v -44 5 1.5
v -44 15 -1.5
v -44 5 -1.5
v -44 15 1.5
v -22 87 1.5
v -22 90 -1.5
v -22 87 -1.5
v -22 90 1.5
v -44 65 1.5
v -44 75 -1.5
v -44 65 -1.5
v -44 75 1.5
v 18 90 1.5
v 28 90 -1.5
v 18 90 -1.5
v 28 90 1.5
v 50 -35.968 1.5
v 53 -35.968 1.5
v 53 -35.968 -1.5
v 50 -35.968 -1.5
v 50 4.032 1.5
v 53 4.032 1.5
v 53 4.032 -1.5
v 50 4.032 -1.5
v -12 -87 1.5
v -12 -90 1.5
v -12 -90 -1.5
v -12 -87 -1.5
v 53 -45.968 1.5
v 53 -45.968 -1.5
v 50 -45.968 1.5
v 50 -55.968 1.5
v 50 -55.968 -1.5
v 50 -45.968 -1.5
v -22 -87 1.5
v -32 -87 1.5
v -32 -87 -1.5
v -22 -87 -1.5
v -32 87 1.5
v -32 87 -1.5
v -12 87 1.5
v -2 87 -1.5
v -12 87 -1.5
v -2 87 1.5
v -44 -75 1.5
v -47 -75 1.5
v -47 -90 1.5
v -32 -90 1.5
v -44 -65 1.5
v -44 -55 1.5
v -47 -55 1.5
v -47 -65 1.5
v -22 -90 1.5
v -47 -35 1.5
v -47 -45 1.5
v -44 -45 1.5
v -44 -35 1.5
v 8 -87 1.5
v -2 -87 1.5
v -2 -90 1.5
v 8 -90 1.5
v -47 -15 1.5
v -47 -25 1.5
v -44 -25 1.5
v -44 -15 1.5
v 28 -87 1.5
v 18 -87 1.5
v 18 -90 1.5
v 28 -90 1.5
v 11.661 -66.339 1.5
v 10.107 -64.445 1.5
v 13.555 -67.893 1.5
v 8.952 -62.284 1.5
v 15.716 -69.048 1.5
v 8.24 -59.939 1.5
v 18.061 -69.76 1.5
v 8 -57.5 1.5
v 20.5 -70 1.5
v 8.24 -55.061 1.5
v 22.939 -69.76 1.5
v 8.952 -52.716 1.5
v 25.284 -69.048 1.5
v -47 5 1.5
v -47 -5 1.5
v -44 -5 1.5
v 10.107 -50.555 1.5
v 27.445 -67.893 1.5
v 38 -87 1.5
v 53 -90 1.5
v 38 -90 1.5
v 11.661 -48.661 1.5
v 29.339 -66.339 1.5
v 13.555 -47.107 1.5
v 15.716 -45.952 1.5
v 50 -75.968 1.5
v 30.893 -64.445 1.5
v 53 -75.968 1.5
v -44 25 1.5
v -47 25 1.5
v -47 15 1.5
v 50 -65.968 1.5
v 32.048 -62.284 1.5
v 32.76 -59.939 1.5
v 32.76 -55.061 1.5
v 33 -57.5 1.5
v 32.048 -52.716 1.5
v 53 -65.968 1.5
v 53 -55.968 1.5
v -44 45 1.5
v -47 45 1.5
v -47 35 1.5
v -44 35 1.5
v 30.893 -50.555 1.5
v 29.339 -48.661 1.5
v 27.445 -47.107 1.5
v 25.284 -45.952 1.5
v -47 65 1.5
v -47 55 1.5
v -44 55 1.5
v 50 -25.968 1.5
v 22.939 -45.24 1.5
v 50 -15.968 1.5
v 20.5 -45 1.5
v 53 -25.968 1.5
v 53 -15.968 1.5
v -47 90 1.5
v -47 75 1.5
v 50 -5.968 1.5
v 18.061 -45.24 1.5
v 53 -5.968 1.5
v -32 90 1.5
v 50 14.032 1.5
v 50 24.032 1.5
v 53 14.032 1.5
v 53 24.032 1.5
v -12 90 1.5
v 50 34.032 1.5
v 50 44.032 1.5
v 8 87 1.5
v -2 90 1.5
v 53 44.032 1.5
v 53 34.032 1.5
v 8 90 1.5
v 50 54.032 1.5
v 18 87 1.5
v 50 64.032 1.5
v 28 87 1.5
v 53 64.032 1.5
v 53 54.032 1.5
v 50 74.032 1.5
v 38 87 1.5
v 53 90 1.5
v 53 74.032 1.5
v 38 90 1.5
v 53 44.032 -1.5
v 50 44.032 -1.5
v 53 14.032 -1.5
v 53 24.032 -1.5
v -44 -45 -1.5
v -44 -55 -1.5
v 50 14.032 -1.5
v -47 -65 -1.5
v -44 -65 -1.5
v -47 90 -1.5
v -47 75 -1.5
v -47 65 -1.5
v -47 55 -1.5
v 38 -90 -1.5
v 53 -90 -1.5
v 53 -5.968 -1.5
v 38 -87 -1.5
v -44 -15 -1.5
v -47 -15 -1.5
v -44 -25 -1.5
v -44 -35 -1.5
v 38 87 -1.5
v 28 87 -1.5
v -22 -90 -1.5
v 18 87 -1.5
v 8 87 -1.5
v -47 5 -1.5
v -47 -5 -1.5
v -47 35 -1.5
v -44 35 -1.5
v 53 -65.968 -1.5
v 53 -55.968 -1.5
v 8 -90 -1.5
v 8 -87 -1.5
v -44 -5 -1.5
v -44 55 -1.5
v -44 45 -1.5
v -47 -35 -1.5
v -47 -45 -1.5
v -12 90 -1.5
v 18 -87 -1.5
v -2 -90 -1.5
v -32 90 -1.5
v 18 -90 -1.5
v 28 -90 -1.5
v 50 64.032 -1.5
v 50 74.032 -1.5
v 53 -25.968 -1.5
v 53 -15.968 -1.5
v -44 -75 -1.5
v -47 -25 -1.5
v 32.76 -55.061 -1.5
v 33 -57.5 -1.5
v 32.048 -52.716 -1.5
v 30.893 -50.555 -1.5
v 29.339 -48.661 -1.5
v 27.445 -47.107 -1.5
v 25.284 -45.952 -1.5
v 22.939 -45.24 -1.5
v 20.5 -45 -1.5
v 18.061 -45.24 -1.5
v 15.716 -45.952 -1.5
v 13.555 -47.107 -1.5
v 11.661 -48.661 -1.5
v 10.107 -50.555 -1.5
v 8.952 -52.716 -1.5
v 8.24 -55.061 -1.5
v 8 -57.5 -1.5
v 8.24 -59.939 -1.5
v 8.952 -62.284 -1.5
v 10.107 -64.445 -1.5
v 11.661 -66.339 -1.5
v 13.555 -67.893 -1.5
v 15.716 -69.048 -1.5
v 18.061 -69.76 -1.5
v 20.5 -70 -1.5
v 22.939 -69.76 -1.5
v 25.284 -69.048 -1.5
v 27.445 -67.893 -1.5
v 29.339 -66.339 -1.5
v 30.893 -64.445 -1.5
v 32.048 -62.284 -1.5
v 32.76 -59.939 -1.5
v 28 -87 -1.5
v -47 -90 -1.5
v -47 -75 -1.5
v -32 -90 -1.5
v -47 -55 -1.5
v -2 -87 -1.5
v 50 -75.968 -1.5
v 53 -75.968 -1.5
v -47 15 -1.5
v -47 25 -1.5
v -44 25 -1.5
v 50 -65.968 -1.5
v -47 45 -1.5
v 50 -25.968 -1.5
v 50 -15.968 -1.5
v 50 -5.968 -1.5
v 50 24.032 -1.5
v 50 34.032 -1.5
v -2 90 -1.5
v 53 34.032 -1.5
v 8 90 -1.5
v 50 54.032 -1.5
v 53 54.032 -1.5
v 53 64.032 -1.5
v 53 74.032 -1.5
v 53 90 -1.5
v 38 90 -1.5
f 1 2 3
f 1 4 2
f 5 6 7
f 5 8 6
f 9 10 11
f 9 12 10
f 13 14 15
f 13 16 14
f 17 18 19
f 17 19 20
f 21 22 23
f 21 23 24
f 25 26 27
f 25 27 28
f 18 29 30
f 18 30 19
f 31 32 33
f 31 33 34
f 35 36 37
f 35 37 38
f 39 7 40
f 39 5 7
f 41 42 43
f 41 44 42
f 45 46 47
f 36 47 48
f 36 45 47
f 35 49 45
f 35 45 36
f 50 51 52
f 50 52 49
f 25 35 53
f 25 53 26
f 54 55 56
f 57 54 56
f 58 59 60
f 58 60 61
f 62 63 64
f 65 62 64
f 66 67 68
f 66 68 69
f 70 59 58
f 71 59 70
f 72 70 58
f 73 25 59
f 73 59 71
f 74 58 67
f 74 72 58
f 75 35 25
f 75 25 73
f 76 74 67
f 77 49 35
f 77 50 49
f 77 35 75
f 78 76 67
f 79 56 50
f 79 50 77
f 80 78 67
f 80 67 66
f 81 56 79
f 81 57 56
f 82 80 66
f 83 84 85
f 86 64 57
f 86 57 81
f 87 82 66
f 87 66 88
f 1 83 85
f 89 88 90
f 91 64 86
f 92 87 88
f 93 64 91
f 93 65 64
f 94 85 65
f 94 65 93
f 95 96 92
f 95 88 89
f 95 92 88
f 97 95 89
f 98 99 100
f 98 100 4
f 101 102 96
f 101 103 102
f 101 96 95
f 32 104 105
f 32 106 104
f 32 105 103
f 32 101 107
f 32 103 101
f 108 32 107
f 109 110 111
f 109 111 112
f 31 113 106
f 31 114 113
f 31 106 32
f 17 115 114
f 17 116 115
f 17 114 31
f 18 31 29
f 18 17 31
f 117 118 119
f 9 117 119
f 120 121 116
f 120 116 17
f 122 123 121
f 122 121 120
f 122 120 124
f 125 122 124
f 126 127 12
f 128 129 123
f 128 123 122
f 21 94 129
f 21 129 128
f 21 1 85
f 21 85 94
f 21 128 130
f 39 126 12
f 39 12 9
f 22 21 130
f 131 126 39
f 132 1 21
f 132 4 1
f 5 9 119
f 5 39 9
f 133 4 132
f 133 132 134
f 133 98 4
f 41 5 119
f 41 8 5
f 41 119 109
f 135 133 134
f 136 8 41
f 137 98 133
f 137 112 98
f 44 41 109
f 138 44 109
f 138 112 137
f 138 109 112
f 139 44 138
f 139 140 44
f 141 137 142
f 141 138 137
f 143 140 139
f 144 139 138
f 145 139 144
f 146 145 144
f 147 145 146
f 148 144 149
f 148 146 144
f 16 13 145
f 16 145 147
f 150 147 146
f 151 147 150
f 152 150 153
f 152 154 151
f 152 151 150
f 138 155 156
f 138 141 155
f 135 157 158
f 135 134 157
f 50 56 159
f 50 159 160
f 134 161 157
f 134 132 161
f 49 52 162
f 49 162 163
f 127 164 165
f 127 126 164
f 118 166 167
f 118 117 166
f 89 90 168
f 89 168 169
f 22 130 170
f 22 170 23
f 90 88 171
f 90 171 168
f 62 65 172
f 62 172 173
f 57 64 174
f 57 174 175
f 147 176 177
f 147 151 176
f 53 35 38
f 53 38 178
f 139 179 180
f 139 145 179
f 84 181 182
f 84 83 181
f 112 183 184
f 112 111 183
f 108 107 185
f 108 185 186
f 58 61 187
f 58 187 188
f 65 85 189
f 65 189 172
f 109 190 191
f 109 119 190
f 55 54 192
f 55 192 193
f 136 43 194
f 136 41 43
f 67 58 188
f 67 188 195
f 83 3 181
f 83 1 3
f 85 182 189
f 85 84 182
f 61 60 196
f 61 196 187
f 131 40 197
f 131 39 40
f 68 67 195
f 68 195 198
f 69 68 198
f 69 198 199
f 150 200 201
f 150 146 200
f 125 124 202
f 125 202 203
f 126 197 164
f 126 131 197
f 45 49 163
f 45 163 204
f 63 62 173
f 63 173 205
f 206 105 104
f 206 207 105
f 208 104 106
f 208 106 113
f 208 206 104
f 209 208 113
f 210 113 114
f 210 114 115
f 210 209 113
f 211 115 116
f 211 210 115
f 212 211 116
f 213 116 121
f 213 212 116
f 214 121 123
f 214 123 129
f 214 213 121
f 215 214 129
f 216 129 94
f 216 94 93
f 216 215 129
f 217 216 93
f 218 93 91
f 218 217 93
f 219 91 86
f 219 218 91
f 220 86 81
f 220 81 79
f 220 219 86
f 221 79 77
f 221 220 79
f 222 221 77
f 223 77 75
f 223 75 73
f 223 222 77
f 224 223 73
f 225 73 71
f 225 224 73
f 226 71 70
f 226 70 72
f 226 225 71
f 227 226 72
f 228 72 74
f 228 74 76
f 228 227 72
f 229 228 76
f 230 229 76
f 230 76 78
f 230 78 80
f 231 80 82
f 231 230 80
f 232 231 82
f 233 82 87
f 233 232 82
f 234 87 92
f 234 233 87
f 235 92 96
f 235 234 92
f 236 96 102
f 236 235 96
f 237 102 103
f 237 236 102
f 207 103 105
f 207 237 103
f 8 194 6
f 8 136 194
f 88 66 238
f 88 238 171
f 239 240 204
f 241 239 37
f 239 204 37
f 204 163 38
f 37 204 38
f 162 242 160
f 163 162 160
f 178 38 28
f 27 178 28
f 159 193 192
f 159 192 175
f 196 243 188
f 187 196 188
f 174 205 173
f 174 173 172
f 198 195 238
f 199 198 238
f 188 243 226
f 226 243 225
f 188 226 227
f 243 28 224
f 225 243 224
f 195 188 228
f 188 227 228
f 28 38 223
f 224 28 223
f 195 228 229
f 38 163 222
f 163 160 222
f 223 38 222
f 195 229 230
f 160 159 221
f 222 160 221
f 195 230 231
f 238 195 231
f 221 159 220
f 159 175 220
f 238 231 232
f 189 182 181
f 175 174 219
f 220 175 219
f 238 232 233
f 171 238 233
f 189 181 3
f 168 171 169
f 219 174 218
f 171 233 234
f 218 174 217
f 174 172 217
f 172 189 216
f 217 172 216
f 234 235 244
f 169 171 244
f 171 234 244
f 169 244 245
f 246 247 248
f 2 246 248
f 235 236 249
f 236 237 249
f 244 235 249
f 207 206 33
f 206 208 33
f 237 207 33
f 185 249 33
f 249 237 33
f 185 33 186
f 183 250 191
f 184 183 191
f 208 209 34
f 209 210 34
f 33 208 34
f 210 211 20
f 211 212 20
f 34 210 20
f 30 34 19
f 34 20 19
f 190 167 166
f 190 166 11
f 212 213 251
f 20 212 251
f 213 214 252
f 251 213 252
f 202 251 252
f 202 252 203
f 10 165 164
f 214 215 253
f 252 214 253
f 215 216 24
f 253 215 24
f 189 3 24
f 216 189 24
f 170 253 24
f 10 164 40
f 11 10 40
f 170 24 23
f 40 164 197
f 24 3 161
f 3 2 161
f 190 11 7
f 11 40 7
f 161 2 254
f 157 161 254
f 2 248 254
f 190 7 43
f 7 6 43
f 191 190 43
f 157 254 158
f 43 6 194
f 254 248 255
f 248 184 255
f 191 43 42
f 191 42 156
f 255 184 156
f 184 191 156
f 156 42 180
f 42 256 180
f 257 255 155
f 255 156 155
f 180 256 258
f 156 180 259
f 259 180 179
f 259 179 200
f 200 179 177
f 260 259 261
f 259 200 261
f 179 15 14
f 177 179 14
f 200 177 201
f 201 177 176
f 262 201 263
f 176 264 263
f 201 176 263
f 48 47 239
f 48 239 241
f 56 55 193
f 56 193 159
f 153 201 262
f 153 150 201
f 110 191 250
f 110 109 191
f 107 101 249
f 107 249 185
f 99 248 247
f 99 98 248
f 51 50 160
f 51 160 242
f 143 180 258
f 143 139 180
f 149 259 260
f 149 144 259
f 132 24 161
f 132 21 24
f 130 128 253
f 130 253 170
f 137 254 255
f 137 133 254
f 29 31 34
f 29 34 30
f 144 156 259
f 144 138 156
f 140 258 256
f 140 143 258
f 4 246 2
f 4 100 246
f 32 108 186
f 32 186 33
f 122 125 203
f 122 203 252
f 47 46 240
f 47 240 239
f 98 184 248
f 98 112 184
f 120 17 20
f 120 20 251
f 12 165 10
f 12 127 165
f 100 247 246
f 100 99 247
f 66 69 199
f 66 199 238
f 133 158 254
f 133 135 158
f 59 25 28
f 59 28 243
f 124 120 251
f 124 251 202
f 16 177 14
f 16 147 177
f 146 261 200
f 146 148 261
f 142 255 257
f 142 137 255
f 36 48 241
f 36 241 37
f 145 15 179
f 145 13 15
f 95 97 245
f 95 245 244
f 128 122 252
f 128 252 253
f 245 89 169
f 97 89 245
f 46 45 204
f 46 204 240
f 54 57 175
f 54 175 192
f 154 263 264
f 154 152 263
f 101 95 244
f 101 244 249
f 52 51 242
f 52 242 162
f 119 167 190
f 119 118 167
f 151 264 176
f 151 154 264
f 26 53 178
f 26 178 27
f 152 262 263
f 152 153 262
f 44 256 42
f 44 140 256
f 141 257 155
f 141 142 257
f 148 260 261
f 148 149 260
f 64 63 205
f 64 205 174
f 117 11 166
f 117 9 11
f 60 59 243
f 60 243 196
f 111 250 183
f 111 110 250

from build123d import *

# Parameters (mm, degrees)
F0_R     = 12.5
F1_DEPTH = 1.5


# Not quite as in the source:
# - ends of sketch curves that miss each other by under 0.0002 mm in the source are joined


with BuildPart() as f1:
    # F0 (on Top) → F1 (new body, symmetric)
    with BuildSketch(Plane.XY):
        Polygon((-46.9999983907, 3.8743e-06), (-46.9999983907, -4.9999961257), (-43.9999983907, -4.9999961257), (-43.9999983907, -14.9999961257), (-46.9999983907, -14.9999961257), (-46.9999983907, -24.9999961257), (-43.9999983907, -24.9999961257), (-43.9999983907, -34.9999961257), (-46.9999983907, -34.9999961257), (-46.9999983907, -44.9999961257), (-43.9999983907, -44.9999961257), (-43.9999983907, -54.9999961257), (-46.9999983907, -54.9999961257), (-46.9999983907, -64.9999961257), (-43.9999983907, -64.9999961257), (-43.9999983907, -74.9999961257), (-46.9999983907, -74.9999961257), (-46.9999983907, -89.9999961257), (-31.9999983907, -89.9999961257), (-31.9999983907, -86.9999961257), (-21.9999983907, -86.9999961257), (-21.9999983907, -89.9999961257), (-11.9999983907, -89.9999961257), (-11.9999983907, -86.9999961257), (-1.9999983907, -86.9999961257), (-1.9999983907, -89.9999961257), (8.0000016093, -89.9999961257), (8.0000016093, -86.9999961257), (18.0000016093, -86.9999961257), (18.0000016093, -89.9999961257), (28.0000016093, -89.9999961257), (28.0000016093, -86.9999961257), (38.0000016093, -86.9999961257), (38.0000016093, -89.9999961257), (53.0000016093, -89.9999961257), (53.0000030994, -75.968132019), (50.0000030994, -75.968132019), (50.0000030994, -65.968132019), (53.0000030994, -65.968132019), (53.0000030994, -55.968132019), (50.0000030994, -55.968132019), (50.0000030994, -45.968132019), (53.0000030994, -45.968132019), (53.0000030994, -35.968132019), (50.0000030994, -35.968132019), (50.0000030994, -25.968132019), (53.0000030994, -25.968132019), (53.0000030994, -15.968132019), (50.0000030994, -15.968132019), (50.0000030994, -5.968132019), (53.0000030994, -5.968132019), (53.0000030994, 3.8743e-06), (53.0000030994, 4.031867981), (50.0000030994, 4.031867981), (50.0000030994, 14.031867981), (53.0000030994, 14.031867981), (53.0000030994, 24.031867981), (50.0000030994, 24.031867981), (50.0000030994, 34.031867981), (53.0000030994, 34.031867981), (53.0000030994, 44.031867981), (50.0000030994, 44.031867981), (50.0000030994, 54.031867981), (53.0000030994, 54.031867981), (53.0000030994, 64.031867981), (50.0000030994, 64.031867981), (50.0000030994, 74.031867981), (53.0000030994, 74.031867981), (53.0000030994, 90.0000038743), (38.0000016093, 90.0000035763), (38.0000016093, 87.0000035763), (28.0000016093, 87.0000035763), (28.0000016093, 90.0000035763), (18.0000016093, 90.0000035763), (18.0000016093, 87.0000035763), (8.0000016093, 87.0000035763), (8.0000016093, 90.0000035763), (-1.9999983907, 90.0000035763), (-1.9999983907, 87.0000035763), (-11.9999983907, 87.0000035763), (-11.9999983907, 90.0000035763), (-21.9999983907, 90.0000035763), (-21.9999983907, 87.0000035763), (-31.9999983907, 87.0000035763), (-31.9999983907, 90.0000035763), (-46.9999983907, 90.0000035763), (-46.9999983907, 75.0000038743), (-43.9999983907, 75.0000038743), (-43.9999983907, 65.0000038743), (-46.9999983907, 65.0000038743), (-46.9999983907, 55.0000038743), (-43.9999983907, 55.0000038743), (-43.9999983907, 45.0000038743), (-46.9999983907, 45.0000038743), (-46.9999983907, 35.0000038743), (-43.9999983907, 35.0000038743), (-43.9999983907, 25.0000038743), (-46.9999983907, 25.0000038743), (-46.9999983907, 15.0000038743), (-43.9999983907, 15.0000038743), (-43.9999983907, 5.0000038743), (-46.9999983907, 5.0000038743), align=None)
        with Locations((20.5000030994, -57.4999969183)):
            Circle(F0_R, mode=Mode.SUBTRACT)
    extrude(amount=F1_DEPTH, both=True)


solid = f1.part
